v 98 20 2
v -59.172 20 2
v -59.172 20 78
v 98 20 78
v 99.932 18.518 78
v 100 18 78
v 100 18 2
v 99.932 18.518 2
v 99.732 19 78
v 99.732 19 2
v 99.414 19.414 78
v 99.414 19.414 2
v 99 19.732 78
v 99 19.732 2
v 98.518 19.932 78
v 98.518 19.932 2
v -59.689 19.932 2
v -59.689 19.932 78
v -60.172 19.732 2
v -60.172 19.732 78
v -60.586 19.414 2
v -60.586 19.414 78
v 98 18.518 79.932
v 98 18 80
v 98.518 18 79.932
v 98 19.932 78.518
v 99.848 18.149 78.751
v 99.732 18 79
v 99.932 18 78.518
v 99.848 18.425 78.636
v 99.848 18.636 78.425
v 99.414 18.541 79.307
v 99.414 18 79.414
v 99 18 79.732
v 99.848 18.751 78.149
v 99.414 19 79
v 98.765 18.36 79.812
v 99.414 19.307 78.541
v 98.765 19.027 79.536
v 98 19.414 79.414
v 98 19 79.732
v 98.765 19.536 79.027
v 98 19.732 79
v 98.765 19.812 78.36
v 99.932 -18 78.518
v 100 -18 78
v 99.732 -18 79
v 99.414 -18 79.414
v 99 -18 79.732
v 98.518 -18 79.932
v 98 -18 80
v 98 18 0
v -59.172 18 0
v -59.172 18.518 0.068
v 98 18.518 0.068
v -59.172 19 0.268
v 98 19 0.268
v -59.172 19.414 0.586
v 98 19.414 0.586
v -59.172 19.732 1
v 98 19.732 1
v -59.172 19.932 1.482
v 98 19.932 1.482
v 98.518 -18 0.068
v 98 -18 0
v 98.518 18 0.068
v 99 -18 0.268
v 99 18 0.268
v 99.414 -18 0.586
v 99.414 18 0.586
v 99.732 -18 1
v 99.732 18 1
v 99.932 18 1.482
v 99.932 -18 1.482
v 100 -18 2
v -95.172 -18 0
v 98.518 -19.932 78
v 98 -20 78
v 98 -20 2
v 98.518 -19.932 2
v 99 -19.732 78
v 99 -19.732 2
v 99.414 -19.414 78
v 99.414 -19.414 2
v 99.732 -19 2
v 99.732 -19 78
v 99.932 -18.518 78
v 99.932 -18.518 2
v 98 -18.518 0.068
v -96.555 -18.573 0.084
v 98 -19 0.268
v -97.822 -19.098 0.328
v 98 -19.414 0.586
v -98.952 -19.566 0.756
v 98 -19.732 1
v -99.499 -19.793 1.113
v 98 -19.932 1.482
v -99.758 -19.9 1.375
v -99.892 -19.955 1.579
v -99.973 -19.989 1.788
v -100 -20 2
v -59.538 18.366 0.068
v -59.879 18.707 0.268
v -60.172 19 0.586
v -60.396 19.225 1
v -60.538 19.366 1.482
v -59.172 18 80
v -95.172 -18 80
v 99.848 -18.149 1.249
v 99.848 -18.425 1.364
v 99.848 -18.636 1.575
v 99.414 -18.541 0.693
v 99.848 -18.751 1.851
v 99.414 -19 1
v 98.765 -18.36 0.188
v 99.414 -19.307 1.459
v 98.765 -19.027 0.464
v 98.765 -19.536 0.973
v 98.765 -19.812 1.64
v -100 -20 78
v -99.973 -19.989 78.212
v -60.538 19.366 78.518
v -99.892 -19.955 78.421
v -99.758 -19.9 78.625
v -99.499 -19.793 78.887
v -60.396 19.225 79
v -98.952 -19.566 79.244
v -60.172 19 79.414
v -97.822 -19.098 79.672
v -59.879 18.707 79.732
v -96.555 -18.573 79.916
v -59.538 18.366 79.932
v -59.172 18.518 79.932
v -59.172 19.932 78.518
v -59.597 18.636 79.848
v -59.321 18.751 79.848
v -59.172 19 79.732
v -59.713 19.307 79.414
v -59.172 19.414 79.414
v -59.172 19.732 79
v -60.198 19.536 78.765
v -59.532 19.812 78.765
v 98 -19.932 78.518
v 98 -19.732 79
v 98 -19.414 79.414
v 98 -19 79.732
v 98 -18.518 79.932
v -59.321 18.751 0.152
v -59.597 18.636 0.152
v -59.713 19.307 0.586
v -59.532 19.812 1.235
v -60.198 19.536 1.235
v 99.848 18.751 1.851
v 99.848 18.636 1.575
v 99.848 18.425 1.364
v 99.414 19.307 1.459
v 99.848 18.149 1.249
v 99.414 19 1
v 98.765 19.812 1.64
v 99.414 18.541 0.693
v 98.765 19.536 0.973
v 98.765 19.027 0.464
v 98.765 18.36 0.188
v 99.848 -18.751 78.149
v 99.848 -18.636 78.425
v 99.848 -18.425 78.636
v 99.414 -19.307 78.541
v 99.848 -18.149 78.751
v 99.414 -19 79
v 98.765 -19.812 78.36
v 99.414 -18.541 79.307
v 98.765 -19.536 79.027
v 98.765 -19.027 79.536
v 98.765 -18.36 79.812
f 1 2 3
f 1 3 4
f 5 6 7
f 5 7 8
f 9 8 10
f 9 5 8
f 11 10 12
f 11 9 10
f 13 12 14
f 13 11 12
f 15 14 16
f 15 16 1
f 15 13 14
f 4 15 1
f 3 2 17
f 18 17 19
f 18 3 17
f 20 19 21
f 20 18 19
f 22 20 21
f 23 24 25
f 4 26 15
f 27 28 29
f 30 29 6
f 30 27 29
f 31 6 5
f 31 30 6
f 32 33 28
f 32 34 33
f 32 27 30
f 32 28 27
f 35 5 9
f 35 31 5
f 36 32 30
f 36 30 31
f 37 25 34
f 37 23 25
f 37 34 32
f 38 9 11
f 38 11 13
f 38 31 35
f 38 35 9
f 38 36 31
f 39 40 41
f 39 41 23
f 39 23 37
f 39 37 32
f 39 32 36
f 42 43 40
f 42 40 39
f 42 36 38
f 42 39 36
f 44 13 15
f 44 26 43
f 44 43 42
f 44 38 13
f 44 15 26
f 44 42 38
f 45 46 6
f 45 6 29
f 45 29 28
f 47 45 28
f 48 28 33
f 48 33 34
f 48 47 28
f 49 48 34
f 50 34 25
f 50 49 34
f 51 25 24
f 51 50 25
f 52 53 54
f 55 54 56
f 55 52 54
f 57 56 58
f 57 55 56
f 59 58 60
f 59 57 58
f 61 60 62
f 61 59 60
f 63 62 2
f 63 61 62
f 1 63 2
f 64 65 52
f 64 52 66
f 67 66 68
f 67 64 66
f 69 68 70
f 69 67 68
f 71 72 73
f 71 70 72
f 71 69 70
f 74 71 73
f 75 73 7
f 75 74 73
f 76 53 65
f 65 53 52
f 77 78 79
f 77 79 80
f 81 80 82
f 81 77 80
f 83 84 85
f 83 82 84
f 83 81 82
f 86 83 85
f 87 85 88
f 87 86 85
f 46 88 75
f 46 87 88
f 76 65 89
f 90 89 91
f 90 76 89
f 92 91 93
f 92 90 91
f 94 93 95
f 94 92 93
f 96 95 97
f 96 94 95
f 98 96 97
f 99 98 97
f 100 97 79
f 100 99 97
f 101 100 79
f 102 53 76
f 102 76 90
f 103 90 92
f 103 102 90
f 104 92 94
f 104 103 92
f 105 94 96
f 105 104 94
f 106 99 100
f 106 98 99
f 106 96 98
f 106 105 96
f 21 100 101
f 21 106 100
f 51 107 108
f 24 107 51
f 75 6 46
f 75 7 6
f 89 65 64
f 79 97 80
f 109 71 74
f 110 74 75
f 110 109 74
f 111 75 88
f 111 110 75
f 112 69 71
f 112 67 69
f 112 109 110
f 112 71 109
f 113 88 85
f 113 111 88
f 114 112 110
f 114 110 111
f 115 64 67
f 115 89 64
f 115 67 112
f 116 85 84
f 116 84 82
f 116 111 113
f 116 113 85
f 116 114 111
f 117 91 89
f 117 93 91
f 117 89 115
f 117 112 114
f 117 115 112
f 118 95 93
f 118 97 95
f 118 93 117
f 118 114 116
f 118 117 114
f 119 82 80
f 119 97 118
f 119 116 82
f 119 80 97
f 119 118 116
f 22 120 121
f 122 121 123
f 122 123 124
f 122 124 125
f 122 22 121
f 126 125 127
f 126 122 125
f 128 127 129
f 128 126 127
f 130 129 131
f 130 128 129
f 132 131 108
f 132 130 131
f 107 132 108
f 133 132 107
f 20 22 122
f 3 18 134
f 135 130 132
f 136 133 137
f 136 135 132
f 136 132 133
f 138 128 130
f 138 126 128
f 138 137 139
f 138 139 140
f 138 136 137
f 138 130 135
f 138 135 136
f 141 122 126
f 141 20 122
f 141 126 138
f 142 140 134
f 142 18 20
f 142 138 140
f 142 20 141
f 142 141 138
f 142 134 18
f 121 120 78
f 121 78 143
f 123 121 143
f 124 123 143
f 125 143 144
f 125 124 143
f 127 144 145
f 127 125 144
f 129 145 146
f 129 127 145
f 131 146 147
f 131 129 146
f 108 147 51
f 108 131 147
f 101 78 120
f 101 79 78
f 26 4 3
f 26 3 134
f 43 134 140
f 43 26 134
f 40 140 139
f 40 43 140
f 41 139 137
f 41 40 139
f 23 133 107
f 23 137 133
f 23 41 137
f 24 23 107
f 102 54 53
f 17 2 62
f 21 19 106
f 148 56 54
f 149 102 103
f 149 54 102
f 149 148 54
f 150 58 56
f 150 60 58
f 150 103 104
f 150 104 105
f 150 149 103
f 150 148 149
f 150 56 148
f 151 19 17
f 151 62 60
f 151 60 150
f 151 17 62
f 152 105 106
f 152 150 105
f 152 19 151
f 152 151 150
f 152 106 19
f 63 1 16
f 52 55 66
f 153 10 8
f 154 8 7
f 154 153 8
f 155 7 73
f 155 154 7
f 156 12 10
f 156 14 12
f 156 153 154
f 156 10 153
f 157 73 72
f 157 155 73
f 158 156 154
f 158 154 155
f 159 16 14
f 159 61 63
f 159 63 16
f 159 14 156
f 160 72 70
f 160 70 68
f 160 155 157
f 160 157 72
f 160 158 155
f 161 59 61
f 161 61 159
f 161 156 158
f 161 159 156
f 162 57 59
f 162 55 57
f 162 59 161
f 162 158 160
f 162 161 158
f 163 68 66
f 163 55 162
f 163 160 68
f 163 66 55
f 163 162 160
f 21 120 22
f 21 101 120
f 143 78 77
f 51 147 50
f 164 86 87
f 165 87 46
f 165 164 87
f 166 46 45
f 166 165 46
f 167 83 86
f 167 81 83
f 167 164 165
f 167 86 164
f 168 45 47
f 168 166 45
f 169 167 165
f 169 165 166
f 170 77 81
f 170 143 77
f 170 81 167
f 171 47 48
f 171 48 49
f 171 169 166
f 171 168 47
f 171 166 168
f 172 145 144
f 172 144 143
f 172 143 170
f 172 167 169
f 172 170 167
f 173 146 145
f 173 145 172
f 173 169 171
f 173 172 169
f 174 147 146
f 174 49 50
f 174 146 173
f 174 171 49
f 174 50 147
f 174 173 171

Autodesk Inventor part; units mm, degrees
ref_plane "YZ Plane" through (0, 0, 0) normal (1, 0, 0) x (0, 1, 0)
ref_plane "XZ Plane" through (0, 0, 0) normal (0, 1, 0) x (-1, 0, 0)
ref_plane "XY Plane" through (0, 0, 0) normal (0, 0, 1) x (1, 0, 0)
sketch "Boceto1" plane through (0, 0, 0) normal (0, 0, 1) x (1, 0, 0)
  line L0 (100, -20) -> (-100, -20)
  line L1 (-60, 20) -> (100, 20)
  line L2 (100, 20) -> (100, -20)
  line L3 (100, -20) -> (-66.6667, 13.3333) construction
  line L4 (-100, -20) -> (100, 20) construction
  line L5 (-100, -20) -> (-60, 20)
  line L6 (-100, -20) -> (-43.4315, -20) construction
  point P0 (0, 0)
  dimension "d2" = 45
extrude "Extrusión1" add sketch "Boceto1" along normal blind 80
fillet "Empalme1" radius 2 11 edges at (20, 20, 0) (20, 20, 80) (0, -20, 0) (0, -20, 80) (-80, 0, 80) (-60, 20, 40) (-80, 0, 0) (100, 20, 40) (100, 0, 80) (100, 0, 0) (100, -20, 40)
properties part number "union_ruedas" material "Hierro, fundido"
